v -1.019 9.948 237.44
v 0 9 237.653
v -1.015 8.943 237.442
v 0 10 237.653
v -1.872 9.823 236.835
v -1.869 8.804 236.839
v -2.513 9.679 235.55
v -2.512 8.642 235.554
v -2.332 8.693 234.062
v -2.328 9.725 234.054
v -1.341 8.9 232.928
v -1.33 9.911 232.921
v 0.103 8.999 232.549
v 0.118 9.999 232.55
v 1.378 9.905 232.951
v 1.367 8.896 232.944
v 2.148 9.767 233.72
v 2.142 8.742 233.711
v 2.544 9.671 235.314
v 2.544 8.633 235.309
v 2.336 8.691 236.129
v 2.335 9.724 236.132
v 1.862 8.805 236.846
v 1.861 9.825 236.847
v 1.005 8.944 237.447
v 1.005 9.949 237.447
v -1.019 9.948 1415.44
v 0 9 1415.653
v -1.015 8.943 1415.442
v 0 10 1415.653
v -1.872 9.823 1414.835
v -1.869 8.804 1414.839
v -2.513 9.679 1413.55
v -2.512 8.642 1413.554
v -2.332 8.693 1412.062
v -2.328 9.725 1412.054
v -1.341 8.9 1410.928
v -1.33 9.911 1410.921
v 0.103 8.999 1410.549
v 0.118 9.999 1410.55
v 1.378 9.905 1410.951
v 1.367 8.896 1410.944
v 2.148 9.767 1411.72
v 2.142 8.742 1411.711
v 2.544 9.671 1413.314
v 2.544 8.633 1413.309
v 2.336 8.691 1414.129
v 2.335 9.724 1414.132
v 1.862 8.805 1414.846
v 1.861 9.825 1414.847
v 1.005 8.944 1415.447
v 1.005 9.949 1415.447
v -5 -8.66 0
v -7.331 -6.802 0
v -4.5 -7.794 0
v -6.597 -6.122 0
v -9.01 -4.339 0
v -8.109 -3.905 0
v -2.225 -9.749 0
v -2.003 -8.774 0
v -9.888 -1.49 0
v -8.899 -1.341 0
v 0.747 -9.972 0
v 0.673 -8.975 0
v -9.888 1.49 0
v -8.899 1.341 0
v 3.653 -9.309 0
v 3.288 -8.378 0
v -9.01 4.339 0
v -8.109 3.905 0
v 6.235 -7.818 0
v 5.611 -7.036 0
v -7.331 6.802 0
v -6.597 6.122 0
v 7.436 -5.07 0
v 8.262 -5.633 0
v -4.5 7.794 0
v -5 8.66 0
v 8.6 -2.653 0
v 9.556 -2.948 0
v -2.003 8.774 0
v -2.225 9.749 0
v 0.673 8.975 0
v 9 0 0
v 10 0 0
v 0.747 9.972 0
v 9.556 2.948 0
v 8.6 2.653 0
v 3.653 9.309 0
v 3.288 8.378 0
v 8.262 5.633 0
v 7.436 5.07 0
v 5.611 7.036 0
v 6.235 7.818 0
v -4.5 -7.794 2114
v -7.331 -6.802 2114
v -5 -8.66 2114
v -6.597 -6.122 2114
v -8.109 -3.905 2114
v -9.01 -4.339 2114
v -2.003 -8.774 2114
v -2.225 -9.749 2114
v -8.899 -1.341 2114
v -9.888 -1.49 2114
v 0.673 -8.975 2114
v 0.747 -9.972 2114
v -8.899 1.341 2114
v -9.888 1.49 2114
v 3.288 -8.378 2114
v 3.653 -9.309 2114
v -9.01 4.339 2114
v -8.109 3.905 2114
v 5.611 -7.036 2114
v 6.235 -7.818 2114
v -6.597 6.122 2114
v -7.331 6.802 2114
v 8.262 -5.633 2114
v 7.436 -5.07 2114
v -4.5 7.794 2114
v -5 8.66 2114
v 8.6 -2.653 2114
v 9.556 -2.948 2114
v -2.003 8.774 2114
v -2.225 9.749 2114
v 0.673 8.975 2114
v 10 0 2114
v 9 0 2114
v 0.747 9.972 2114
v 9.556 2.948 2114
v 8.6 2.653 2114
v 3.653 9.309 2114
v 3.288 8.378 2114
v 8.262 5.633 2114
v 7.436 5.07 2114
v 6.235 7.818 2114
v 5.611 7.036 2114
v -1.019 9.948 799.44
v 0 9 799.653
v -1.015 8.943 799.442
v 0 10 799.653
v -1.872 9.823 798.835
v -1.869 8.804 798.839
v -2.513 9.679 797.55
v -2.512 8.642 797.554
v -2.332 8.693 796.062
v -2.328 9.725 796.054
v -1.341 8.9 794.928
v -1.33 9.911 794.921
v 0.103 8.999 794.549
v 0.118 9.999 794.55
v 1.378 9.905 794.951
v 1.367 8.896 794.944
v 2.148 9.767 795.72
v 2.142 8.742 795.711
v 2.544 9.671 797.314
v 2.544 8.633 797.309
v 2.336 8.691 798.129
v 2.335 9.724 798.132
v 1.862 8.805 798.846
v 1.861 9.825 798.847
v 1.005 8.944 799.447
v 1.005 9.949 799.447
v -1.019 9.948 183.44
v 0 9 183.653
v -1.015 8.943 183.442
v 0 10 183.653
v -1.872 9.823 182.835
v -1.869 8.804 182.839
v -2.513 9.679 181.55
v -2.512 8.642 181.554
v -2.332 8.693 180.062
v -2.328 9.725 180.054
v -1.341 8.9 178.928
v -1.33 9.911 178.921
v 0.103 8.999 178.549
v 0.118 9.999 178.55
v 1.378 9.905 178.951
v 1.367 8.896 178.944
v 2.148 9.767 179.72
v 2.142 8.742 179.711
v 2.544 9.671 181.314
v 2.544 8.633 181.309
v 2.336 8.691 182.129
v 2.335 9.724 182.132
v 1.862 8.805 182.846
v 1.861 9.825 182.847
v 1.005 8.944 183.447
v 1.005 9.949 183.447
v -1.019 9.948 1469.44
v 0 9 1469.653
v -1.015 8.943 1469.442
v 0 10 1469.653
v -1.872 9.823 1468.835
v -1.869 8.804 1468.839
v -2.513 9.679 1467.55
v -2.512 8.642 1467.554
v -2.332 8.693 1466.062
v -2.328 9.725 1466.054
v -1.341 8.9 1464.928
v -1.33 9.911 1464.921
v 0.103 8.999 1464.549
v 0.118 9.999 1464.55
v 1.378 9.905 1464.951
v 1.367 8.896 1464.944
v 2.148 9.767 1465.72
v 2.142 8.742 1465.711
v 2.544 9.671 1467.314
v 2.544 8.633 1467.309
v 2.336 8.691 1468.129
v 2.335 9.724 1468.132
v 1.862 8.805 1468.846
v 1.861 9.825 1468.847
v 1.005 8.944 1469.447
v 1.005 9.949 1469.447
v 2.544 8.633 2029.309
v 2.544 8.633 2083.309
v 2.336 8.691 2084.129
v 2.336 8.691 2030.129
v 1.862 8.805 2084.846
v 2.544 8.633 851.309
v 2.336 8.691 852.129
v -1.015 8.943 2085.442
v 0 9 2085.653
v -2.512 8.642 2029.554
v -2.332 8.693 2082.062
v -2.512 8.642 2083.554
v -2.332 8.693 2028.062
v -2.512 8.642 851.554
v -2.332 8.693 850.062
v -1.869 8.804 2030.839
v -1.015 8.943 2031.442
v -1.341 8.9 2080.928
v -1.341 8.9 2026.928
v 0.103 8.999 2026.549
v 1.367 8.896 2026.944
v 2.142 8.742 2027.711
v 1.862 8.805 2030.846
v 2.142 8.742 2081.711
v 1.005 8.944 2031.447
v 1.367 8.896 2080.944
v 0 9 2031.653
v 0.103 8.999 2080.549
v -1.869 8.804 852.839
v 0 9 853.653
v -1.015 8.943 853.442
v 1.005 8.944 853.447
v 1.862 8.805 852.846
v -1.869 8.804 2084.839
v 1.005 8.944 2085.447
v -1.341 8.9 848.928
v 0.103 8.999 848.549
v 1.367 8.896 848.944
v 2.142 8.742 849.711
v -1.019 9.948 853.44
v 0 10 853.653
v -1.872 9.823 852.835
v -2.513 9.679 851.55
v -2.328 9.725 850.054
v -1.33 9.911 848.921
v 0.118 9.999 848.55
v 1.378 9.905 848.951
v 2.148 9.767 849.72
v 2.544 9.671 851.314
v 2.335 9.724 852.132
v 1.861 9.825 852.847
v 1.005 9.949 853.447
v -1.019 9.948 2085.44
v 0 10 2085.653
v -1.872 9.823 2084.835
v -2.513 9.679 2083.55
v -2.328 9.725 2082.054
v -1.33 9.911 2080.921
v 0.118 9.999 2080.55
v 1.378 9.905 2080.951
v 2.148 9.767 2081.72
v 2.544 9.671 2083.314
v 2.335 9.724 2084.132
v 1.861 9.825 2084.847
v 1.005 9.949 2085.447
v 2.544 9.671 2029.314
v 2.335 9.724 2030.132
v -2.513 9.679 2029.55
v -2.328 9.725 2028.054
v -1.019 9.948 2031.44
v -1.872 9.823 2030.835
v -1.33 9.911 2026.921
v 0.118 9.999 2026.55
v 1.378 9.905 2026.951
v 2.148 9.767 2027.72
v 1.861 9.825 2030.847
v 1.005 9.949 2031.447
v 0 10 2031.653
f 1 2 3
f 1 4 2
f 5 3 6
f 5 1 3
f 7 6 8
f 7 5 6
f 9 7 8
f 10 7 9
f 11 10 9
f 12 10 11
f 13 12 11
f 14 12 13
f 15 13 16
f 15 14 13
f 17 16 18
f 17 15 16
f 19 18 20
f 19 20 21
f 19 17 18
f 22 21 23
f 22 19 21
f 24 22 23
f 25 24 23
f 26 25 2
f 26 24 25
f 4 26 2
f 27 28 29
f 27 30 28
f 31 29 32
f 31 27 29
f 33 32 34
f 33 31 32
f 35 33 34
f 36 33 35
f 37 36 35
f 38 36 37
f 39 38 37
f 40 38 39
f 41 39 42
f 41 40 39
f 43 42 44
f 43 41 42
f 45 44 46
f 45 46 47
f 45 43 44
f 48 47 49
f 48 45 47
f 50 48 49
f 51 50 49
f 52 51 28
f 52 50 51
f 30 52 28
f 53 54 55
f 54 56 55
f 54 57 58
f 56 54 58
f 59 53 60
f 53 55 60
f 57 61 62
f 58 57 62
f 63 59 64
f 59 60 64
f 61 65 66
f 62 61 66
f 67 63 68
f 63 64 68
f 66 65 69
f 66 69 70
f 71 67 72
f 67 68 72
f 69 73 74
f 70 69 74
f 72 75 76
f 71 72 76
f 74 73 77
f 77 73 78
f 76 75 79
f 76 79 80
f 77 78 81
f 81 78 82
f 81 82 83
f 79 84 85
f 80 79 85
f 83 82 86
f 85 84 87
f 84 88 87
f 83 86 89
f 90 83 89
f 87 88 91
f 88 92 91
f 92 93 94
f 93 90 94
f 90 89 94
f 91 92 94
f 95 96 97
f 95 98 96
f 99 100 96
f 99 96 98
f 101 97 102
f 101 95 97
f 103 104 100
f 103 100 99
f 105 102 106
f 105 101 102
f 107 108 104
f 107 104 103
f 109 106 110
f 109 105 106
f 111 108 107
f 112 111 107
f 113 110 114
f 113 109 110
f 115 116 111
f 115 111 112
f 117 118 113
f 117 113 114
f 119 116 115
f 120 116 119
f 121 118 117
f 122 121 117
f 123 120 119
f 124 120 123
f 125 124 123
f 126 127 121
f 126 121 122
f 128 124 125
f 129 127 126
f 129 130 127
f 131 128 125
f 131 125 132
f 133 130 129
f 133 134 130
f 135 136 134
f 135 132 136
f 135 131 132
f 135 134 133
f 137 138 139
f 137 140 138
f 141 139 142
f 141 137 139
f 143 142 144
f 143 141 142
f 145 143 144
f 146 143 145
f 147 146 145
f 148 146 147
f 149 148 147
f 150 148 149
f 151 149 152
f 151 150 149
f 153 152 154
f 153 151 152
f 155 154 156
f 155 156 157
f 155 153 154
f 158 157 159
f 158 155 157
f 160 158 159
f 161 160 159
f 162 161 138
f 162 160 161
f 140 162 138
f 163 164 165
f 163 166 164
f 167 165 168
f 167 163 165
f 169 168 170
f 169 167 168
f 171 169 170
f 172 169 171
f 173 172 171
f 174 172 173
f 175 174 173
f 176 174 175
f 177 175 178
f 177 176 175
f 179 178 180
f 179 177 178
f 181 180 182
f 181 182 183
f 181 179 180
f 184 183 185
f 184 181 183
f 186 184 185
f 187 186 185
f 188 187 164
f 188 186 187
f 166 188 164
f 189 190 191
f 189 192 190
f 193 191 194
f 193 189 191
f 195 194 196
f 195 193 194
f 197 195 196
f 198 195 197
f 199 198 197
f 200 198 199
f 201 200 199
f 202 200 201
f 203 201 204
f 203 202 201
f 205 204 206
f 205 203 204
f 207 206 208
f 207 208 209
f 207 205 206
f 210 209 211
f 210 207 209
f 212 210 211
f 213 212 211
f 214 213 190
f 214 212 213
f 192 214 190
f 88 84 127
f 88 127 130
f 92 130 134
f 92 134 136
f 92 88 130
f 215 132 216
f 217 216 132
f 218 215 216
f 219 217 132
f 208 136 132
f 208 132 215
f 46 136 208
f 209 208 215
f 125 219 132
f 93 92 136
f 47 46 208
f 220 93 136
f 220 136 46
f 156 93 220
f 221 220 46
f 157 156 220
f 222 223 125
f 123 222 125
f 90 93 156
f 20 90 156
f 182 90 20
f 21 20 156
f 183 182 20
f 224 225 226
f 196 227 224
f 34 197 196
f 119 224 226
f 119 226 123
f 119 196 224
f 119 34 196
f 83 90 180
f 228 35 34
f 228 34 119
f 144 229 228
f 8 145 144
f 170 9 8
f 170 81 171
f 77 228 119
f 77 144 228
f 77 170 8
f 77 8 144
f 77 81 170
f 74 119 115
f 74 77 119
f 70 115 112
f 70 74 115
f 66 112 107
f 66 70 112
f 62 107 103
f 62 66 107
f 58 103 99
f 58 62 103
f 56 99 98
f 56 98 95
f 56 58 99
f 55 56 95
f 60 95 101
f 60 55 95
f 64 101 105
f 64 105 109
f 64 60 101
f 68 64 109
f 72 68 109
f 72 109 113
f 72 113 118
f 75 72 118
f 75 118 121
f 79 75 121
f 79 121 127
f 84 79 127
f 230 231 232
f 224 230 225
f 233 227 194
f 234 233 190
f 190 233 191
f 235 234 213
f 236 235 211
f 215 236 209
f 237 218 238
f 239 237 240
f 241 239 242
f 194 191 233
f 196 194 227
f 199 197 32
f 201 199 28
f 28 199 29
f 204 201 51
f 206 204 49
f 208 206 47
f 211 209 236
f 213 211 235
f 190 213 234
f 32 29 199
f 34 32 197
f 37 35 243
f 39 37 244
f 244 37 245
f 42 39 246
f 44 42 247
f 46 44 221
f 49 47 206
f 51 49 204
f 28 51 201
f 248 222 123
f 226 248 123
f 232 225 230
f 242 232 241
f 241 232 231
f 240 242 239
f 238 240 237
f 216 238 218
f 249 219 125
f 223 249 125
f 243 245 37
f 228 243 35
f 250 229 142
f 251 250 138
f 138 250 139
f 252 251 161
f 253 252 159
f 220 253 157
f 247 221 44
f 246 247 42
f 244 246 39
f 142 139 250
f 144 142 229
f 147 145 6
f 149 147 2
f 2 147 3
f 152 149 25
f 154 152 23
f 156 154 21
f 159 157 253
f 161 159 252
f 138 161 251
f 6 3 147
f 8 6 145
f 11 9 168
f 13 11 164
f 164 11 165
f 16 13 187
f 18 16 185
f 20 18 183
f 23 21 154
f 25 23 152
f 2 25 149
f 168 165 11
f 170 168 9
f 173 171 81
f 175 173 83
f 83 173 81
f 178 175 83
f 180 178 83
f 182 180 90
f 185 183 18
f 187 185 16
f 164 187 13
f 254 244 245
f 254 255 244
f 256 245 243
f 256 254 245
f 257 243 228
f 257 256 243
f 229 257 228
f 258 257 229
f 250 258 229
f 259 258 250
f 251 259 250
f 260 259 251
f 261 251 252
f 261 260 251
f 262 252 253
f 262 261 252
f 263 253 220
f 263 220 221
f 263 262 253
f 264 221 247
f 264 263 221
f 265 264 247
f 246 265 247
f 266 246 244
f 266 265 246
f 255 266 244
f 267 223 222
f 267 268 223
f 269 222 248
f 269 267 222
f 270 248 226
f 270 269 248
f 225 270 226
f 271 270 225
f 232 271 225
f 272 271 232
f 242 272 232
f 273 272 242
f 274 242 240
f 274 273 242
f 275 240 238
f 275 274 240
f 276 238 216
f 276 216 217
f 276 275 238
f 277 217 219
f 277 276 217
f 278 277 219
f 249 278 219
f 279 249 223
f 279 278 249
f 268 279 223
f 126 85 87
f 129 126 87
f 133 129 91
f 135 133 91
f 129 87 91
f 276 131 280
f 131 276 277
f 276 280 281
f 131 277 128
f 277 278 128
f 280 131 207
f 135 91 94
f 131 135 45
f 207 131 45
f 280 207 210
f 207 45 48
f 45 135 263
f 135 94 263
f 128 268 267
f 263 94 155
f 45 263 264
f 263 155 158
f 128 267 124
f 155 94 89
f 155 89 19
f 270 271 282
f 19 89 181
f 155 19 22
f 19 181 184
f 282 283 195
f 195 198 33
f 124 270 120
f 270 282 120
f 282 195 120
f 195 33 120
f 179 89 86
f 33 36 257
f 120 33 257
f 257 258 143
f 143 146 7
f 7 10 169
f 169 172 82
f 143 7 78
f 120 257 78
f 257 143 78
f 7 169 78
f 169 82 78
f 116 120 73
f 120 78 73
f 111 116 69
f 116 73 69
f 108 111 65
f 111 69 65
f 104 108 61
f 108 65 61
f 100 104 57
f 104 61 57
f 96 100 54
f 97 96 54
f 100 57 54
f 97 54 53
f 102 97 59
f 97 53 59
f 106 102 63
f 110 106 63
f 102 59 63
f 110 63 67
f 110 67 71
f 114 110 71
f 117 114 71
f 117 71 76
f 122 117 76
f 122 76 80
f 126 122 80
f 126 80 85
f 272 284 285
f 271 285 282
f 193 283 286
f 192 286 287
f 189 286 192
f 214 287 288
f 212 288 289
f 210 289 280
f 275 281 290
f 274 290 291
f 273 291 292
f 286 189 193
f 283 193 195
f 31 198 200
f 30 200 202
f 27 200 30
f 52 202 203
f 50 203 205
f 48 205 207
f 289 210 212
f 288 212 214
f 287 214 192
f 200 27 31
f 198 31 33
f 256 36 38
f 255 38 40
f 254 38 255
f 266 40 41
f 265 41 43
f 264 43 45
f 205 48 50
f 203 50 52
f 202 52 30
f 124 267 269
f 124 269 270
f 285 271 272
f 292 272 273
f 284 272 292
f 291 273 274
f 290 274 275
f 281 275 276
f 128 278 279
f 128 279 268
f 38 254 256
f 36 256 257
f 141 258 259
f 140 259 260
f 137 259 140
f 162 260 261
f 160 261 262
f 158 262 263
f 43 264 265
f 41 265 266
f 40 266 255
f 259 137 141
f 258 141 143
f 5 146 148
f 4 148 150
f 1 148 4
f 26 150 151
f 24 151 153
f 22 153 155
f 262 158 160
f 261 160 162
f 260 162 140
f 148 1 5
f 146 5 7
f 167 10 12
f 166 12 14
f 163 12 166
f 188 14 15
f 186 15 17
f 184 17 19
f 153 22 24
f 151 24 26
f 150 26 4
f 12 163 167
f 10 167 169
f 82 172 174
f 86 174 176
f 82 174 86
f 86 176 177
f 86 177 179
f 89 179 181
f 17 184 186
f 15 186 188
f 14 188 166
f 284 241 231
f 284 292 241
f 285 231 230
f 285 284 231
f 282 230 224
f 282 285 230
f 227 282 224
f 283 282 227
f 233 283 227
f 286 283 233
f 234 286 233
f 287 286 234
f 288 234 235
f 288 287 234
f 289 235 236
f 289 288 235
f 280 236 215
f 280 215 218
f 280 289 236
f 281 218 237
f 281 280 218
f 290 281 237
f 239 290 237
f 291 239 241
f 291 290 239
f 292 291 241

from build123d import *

# Parameters (mm, degrees)
SKETCH1_R                       = 10
SKETCH1_R_2                     = 9
EXTRUDE_THIN1_DEPTH             = 2114
F_10_CLEARANCE_HOLE1_AT_2_COUNT = 2
F_10_CLEARANCE_HOLE1_AT_2_PITCH = 54
LPATTERN1_COUNT                 = 4
LPATTERN1_PITCH                 = 616


with BuildPart() as part:
    # Sketch1 → Extrude-Thin1 (new body)
    with BuildSketch(Plane.XY):
        Circle(SKETCH1_R)
        Circle(SKETCH1_R_2, mode=Mode.SUBTRACT)
    extrude(amount=EXTRUDE_THIN1_DEPTH)

    # Sketch4 → #10 Clearance Hole1 (revolve, cut)
    with BuildSketch(Plane(origin=(0, 10, 181.1), x_dir=(0, 0, 1), z_dir=(1, 0, 0))):
        Polygon((0, 0), (0, 11.533816902), (2.5527, 10), (2.5527, 0), align=None)
    f_10_clearance_hole1 = revolve(axis=Axis((0, 16.35, 181.1), (0, -1, 0)), mode=Mode.SUBTRACT)

    # #10 Clearance Hole1 at 2: #10 Clearance Hole1 ×2
    with Locations(*[(0, 0, i * F_10_CLEARANCE_HOLE1_AT_2_PITCH) for i in range(1, F_10_CLEARANCE_HOLE1_AT_2_COUNT)]):
        add(f_10_clearance_hole1, mode=Mode.SUBTRACT)

    # LPattern1: #10 Clearance Hole1 ×4
    with Locations(*[(0, 0, i * LPATTERN1_PITCH) for i in range(1, LPATTERN1_COUNT)]):
        add(f_10_clearance_hole1, mode=Mode.SUBTRACT)

    # LPattern1 copy 1 sketch → LPattern1 copy 1 (revolve, cut)
    with BuildSketch(Plane(origin=(0, 10, 851.1), x_dir=(0, 0, 1), z_dir=(1, 0, 0))):
        Polygon((0, 0), (0, 11.533816902), (2.5527, 10), (2.5527, 0), align=None)
    revolve(axis=Axis((0, 16.35, 851.1), (0, -1, 0)), mode=Mode.SUBTRACT)

    # LPattern1 copy 2 sketch → LPattern1 copy 2 (revolve, cut)
    with BuildSketch(Plane(origin=(0, 10, 1467.1), x_dir=(0, 0, 1), z_dir=(1, 0, 0))):
        Polygon((0, 0), (0, 11.533816902), (2.5527, 10), (2.5527, 0), align=None)
    revolve(axis=Axis((0, 16.35, 1467.1), (0, -1, 0)), mode=Mode.SUBTRACT)

    # LPattern1 copy 3 sketch → LPattern1 copy 3 (revolve, cut)
    with BuildSketch(Plane(origin=(0, 10, 2083.1), x_dir=(0, 0, 1), z_dir=(1, 0, 0))):
        Polygon((0, 0), (0, 11.533816902), (2.5527, 10), (2.5527, 0), align=None)
    revolve(axis=Axis((0, 16.35, 2083.1), (0, -1, 0)), mode=Mode.SUBTRACT)


solid = part.part
